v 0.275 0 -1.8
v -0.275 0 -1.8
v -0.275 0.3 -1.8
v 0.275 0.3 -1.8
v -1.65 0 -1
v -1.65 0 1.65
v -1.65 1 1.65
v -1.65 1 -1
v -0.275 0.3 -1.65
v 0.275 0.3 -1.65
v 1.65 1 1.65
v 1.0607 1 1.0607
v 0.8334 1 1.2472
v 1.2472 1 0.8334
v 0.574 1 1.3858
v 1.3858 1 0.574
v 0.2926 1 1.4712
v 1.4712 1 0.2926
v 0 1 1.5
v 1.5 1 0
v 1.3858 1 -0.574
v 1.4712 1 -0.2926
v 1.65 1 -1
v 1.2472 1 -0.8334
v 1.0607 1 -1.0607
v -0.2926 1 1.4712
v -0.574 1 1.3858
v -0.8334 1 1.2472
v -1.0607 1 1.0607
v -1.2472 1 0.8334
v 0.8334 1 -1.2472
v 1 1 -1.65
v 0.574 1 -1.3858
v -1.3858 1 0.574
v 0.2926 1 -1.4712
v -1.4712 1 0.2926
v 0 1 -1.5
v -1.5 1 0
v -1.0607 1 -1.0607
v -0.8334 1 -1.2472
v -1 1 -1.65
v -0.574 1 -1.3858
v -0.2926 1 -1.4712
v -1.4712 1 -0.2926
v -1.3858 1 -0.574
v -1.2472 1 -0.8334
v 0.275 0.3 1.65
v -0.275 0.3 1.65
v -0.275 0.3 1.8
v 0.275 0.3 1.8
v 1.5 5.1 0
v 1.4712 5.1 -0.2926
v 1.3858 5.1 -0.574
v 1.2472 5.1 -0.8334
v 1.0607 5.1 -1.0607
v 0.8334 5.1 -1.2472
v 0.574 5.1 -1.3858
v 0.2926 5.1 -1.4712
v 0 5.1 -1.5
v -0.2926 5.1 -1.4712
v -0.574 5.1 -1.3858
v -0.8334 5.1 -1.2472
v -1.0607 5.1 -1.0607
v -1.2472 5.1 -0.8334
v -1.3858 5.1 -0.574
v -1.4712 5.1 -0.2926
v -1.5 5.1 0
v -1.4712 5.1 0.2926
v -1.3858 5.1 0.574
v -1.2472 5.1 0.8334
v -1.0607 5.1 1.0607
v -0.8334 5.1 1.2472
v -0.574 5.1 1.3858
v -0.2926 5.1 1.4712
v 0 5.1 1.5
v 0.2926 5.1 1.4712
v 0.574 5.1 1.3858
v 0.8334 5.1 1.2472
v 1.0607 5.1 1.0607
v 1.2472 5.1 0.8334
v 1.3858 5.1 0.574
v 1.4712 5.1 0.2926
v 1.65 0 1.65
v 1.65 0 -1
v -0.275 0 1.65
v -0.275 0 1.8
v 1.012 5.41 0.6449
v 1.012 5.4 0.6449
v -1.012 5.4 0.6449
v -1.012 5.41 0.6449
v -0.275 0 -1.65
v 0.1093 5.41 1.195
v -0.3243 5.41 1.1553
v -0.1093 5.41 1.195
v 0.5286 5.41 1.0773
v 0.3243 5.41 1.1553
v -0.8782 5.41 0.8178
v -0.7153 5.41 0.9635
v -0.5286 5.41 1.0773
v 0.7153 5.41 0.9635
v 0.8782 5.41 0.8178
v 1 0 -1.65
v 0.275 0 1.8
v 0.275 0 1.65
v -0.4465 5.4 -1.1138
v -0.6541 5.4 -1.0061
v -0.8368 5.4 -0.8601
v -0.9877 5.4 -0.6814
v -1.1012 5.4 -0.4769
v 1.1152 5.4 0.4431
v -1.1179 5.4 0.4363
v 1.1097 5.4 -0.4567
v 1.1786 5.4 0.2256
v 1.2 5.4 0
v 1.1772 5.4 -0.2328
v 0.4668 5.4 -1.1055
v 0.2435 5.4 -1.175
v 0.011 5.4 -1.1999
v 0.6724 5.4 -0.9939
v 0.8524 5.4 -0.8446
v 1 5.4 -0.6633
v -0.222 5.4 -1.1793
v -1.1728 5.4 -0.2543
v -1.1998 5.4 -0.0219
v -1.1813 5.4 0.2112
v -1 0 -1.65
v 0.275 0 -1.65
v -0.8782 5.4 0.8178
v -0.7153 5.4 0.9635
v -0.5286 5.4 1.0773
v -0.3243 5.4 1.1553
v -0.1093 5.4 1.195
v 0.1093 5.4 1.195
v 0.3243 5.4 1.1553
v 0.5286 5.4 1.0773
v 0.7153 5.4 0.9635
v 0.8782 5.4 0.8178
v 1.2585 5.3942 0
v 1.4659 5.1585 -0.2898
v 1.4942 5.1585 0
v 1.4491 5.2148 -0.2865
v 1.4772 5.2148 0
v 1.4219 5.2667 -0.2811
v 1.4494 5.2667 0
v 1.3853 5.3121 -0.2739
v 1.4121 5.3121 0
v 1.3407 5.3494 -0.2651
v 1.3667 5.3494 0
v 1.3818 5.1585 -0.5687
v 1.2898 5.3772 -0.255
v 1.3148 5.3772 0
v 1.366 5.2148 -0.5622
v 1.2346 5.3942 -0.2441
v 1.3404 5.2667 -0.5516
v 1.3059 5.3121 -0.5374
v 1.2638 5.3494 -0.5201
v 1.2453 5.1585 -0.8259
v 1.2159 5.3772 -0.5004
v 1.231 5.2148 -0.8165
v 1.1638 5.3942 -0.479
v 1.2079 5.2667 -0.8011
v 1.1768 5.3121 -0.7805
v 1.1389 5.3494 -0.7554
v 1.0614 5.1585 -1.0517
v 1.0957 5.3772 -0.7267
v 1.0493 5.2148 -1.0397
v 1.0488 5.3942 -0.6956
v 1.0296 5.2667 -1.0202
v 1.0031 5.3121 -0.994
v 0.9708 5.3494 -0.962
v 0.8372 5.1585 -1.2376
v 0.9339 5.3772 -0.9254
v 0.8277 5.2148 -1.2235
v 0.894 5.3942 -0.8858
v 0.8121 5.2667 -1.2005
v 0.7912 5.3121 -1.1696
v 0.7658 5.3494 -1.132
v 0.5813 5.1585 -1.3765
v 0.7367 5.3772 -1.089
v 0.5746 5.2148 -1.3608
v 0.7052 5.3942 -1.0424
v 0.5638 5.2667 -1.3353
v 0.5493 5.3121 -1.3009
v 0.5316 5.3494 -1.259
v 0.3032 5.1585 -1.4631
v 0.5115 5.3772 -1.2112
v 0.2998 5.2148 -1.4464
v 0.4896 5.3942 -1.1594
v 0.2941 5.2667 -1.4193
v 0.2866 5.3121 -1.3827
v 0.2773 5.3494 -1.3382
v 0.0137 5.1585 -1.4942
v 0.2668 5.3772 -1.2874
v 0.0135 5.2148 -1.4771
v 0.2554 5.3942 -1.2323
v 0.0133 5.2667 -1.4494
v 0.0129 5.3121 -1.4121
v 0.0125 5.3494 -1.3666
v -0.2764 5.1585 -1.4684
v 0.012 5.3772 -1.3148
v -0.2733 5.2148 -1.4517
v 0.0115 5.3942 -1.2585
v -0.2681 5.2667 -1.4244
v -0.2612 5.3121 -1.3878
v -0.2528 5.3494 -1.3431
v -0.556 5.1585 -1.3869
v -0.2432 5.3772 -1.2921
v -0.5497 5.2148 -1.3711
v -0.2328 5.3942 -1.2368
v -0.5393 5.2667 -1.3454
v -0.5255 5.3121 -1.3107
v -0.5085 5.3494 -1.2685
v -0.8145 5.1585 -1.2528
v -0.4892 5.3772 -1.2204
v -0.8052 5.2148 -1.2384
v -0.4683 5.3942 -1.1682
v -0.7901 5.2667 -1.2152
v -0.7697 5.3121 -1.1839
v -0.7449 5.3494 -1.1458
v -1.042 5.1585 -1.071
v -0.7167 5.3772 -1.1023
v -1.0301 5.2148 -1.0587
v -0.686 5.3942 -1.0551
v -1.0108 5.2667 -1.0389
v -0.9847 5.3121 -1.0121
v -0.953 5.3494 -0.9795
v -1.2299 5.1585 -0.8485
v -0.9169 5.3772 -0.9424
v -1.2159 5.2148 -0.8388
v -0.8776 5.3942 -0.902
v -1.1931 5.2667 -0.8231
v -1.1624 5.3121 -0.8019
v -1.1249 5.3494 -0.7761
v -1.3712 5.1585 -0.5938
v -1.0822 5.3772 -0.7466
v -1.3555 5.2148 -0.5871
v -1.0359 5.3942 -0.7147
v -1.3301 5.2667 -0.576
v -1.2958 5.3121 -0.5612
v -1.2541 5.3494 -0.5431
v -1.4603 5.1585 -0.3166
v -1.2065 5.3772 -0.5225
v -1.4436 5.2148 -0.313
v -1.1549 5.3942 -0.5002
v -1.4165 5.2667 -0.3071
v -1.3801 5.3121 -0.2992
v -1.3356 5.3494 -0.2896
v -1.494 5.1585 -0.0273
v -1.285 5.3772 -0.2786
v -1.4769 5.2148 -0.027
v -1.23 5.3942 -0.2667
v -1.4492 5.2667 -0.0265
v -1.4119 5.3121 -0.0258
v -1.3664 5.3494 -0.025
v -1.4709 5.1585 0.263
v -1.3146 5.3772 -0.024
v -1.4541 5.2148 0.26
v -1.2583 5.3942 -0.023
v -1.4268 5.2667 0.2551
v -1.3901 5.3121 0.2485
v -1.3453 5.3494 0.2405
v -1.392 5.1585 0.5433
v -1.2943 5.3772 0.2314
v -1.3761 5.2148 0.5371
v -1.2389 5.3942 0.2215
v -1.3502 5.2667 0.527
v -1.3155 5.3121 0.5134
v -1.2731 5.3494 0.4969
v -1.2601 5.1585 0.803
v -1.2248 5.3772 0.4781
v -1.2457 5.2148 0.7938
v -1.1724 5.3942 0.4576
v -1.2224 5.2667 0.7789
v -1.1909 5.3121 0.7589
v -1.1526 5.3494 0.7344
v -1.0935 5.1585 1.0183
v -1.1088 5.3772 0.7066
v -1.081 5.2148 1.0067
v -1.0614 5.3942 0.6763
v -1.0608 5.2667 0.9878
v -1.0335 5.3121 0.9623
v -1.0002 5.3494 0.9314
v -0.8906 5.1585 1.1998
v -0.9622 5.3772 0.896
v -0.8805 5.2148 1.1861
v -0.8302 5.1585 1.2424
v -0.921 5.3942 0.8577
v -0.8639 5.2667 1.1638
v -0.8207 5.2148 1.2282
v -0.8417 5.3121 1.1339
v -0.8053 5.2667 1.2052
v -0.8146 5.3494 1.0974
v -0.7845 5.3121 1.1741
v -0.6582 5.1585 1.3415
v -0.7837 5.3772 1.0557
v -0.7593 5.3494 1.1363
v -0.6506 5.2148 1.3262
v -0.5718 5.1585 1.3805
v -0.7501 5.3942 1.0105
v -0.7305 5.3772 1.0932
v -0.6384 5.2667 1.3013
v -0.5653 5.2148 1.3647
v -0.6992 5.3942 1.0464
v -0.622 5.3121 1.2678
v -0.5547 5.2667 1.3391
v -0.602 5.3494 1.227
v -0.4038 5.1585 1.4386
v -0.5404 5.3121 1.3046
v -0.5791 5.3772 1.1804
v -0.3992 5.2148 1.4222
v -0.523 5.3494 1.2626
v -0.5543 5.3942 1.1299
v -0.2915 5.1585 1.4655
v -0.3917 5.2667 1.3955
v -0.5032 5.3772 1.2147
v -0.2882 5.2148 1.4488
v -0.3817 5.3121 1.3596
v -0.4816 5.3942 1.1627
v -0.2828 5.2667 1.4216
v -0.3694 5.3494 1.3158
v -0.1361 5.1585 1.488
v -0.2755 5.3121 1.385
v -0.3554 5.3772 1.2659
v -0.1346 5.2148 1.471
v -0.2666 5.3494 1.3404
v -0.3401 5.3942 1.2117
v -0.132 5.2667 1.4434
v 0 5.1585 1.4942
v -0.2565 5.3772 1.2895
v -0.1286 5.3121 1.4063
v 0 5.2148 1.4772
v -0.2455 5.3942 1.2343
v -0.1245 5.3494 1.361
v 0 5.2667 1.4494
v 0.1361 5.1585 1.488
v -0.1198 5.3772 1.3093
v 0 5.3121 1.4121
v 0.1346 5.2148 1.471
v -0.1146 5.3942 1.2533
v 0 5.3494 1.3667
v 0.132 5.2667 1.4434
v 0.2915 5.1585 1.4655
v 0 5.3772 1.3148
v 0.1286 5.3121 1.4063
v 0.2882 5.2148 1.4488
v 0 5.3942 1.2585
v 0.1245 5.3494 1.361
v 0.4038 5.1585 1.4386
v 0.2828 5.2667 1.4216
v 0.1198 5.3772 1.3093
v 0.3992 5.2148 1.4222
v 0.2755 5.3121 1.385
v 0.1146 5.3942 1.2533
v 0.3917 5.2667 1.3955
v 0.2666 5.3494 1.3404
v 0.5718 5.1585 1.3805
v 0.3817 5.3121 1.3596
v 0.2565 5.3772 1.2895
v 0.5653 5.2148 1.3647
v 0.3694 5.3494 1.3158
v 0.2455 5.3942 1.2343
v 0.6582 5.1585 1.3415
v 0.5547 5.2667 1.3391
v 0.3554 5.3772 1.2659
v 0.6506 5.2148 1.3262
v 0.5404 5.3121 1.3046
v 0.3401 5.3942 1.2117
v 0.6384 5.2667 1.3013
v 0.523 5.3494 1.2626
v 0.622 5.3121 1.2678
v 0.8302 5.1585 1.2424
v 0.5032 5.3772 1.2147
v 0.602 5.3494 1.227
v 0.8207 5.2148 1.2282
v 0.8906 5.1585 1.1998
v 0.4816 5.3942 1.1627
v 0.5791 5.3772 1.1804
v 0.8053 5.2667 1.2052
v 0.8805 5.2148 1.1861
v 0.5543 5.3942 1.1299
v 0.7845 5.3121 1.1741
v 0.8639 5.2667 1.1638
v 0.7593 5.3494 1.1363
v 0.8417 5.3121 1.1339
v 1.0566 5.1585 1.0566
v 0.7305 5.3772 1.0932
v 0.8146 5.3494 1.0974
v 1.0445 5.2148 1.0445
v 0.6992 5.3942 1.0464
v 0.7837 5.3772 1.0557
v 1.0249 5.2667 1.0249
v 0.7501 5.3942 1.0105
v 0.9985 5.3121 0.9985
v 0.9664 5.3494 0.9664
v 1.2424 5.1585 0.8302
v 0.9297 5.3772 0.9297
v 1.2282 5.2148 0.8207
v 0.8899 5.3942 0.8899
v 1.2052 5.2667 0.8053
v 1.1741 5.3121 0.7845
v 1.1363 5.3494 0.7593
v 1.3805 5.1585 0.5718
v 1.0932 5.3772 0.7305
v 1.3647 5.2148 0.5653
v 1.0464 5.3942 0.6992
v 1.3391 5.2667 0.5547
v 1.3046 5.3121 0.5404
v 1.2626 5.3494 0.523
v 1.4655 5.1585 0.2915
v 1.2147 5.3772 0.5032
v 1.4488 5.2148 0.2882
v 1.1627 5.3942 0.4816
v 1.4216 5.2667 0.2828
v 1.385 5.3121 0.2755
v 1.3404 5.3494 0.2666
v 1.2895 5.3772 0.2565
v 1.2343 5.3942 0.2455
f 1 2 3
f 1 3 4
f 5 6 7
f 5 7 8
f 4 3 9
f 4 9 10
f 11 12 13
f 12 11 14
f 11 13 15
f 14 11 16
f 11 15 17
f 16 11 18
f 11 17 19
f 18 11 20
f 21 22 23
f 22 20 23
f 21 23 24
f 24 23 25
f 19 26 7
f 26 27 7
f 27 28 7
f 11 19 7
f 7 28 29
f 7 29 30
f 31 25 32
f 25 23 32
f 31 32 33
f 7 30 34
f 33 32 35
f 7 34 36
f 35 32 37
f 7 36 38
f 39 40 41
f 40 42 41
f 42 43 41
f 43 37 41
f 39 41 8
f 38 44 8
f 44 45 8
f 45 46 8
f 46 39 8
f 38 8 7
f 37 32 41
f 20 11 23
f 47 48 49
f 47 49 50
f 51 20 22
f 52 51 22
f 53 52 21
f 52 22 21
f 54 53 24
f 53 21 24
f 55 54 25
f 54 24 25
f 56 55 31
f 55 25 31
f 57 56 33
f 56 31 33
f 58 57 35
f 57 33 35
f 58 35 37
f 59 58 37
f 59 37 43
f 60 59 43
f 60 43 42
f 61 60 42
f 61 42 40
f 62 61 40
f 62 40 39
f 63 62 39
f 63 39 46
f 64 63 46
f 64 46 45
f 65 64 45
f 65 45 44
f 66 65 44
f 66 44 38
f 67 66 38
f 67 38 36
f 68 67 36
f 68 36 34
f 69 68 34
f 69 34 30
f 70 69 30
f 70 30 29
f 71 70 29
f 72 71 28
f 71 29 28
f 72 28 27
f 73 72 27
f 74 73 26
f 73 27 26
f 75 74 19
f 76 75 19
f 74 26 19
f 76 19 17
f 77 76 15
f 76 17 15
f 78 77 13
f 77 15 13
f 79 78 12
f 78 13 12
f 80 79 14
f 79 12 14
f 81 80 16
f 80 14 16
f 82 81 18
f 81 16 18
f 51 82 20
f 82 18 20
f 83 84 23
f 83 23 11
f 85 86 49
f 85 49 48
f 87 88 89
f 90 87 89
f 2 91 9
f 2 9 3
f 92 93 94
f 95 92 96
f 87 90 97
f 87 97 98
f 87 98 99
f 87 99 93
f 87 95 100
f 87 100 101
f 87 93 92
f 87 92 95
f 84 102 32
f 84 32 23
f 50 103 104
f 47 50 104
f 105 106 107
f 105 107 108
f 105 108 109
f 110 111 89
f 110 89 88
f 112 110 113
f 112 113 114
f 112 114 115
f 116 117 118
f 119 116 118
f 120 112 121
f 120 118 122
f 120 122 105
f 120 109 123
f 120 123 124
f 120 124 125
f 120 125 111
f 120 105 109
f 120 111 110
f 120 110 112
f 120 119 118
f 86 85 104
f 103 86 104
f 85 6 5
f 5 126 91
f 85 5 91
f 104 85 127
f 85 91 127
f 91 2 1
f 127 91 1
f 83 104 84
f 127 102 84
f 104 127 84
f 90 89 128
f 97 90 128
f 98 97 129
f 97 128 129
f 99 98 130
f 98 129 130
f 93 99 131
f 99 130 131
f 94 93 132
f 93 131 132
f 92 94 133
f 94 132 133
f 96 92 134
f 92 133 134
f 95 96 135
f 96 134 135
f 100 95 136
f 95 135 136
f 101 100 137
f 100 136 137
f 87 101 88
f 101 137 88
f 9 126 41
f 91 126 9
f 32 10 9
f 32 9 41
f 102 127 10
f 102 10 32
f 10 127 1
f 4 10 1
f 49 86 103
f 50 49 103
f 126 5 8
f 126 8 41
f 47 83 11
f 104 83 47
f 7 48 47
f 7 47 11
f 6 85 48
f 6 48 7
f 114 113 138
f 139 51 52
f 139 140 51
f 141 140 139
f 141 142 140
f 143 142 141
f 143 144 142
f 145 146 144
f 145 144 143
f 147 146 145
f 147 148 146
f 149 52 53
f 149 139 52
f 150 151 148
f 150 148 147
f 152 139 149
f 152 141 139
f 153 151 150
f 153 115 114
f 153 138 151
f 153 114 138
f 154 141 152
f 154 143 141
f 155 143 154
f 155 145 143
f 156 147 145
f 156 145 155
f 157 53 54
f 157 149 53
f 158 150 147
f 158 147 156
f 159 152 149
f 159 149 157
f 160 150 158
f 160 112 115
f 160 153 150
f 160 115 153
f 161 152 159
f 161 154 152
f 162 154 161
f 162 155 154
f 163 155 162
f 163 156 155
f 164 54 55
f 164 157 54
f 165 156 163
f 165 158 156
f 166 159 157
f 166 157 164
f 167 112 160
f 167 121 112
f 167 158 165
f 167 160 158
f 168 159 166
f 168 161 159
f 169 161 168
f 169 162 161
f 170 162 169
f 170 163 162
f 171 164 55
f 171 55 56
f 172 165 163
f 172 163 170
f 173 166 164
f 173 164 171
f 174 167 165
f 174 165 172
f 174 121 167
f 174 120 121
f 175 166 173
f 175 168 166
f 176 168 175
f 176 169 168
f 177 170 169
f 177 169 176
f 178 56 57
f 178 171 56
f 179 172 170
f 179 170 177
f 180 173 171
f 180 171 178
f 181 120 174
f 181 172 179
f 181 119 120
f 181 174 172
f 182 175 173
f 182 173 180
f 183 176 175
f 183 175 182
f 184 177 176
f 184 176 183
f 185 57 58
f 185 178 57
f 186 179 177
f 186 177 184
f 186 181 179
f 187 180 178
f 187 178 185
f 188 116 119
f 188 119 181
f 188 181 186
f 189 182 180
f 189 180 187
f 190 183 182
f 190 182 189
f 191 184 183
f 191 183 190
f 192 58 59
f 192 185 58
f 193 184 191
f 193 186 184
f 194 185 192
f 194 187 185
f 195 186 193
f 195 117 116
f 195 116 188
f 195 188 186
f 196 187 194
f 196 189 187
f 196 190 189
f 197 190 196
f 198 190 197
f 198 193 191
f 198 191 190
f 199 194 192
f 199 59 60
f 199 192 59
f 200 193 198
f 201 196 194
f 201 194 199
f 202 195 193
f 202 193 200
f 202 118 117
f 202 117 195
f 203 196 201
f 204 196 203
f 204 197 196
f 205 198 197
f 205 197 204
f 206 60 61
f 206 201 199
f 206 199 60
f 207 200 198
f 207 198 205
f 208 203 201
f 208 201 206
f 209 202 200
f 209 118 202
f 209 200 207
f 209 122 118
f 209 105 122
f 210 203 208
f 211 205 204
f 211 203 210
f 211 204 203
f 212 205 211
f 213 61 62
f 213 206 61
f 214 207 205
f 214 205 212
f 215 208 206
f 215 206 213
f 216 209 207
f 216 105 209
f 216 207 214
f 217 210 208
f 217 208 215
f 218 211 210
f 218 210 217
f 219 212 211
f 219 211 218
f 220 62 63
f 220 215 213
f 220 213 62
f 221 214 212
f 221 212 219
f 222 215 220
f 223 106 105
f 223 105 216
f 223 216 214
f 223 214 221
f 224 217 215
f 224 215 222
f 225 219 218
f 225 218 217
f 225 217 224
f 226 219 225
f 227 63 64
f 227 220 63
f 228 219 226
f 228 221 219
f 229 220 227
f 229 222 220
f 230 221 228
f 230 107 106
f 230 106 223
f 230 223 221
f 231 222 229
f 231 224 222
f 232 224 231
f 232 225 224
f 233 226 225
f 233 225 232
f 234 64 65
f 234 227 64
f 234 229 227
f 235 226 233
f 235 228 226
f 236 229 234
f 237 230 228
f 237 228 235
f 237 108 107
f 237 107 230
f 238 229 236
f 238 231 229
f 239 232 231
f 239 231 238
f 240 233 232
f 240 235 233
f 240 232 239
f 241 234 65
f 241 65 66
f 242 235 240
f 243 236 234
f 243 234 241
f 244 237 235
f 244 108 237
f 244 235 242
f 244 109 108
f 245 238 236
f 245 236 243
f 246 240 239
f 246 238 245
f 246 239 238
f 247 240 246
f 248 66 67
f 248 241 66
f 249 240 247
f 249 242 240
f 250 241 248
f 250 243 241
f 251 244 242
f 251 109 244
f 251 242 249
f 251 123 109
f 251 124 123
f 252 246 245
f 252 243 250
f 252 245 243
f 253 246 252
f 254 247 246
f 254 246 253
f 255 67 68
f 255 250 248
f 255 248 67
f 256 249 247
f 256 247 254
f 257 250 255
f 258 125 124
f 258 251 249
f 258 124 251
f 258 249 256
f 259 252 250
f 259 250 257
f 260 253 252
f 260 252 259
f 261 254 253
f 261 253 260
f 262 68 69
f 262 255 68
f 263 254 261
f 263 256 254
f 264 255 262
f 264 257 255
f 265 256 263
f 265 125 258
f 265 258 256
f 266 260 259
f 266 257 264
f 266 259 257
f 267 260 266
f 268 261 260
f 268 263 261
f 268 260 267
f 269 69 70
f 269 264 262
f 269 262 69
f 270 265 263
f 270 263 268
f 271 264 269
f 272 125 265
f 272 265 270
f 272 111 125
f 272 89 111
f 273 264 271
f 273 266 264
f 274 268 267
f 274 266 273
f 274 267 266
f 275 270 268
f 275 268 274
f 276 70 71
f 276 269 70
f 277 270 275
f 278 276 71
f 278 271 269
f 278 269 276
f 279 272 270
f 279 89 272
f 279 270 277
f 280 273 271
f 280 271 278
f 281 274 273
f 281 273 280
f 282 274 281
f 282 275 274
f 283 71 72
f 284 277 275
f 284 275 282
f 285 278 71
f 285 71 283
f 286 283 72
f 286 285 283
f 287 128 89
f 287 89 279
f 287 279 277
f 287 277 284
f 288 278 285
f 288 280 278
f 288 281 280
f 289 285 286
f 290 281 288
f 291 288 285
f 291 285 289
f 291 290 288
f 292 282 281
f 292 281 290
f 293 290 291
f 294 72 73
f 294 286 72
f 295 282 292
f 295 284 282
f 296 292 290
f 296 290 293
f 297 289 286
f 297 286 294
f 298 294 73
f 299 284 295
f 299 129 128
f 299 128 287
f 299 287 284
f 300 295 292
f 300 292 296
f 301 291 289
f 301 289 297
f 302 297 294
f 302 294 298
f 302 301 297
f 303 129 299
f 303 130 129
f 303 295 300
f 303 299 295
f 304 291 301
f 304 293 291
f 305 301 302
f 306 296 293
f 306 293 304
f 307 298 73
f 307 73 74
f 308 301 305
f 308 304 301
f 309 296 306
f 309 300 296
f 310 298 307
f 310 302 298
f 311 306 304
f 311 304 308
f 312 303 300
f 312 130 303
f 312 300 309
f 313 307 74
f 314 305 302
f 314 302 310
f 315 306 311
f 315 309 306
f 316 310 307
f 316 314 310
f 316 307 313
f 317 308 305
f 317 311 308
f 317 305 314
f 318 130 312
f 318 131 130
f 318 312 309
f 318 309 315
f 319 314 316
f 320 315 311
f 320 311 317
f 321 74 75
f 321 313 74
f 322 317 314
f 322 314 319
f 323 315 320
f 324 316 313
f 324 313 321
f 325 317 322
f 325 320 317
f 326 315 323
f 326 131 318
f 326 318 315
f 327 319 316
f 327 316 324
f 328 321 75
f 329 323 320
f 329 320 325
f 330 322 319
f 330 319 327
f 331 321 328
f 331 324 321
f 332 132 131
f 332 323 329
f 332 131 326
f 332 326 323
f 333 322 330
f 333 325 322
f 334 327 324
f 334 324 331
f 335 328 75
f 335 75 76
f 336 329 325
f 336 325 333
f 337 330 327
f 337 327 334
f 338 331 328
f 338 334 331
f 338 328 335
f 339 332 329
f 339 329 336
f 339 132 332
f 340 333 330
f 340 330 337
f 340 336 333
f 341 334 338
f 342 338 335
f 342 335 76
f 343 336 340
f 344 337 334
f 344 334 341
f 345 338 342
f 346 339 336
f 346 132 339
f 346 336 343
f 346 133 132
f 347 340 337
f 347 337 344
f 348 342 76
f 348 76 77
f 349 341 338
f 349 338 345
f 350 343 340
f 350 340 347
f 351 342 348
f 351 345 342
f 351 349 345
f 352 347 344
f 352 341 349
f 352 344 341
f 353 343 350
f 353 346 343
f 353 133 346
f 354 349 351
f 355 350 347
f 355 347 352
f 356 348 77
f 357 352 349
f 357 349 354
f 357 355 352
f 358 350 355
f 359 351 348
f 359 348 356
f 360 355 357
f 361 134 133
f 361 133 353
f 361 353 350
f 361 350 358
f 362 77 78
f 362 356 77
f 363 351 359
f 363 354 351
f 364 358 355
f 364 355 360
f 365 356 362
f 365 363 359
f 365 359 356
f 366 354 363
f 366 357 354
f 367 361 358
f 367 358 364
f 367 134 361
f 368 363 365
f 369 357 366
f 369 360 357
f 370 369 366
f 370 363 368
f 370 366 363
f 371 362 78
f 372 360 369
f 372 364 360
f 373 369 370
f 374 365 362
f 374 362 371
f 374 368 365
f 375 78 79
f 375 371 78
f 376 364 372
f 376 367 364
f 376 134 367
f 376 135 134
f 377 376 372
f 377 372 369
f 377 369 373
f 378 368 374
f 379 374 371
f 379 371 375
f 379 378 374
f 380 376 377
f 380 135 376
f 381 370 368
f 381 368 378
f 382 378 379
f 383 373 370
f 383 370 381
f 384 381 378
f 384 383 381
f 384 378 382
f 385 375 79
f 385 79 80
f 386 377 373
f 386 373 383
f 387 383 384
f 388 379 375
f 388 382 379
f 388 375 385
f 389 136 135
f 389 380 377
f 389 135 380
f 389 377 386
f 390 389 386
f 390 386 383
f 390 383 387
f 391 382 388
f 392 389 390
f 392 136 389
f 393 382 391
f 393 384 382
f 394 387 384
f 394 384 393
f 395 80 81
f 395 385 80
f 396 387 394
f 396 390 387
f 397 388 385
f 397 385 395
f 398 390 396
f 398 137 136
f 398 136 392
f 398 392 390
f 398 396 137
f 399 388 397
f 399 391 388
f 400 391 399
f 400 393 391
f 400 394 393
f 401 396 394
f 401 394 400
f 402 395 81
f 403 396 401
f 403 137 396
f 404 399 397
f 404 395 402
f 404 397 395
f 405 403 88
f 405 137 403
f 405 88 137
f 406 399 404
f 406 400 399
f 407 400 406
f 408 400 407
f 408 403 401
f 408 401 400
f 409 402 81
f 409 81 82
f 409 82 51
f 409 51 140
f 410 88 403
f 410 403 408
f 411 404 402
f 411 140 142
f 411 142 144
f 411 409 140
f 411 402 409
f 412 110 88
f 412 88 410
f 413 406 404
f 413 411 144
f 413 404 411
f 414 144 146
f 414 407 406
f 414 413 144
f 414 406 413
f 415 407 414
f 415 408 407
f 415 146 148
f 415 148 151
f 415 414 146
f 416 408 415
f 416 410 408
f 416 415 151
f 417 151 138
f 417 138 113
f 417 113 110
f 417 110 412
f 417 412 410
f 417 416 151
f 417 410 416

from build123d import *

# Parameters (mm, degrees)
BOSS_EXTRUDE1_DEPTH = 1
SKETCH3_R           = 1.5
BOSS_EXTRUDE2_DEPTH = 5.4
FILLET1_R           = 0.3
SKETCH4_W           = 0.55
SKETCH4_H           = 1.5
BOSS_EXTRUDE3_DEPTH = 0.3
BOSS_EXTRUDE4_DEPTH = 0.01


with BuildPart() as part:
    # Sketch2 → Boss-Extrude1 (new body)
    with BuildSketch(Plane(origin=(0, 0, 0), x_dir=(1, 0, 0), z_dir=(0, 1, 0))):
        Polygon((1.65, -1.65), (-1.65, -1.65), (-1.65, 1), (-1, 1.65), (1, 1.65), (1.65, 1), align=None)
    extrude(amount=BOSS_EXTRUDE1_DEPTH)

    # Sketch3 → Boss-Extrude2 (add)
    with BuildSketch(Plane(origin=(0, 0, 0), x_dir=(1, 0, 0), z_dir=(0, 1, 0))):
        Circle(SKETCH3_R)
    extrude(amount=BOSS_EXTRUDE2_DEPTH)

    # Fillet1
    fillet1_edges = [part.edges().sort_by_distance(p)[0] for p in [
        (-1.5, 5.4, 0),
    ]]
    fillet(fillet1_edges, radius=FILLET1_R)

    # Sketch4 → Boss-Extrude3 (add)
    with BuildSketch(Plane(origin=(0, 0, 0), x_dir=(1, 0, 0), z_dir=(0, 1, 0))):
        with Locations((0, 1.05)):
            Rectangle(SKETCH4_W, SKETCH4_H)
        with Locations((0, -1.05)):
            Rectangle(SKETCH4_W, SKETCH4_H)
    extrude(amount=BOSS_EXTRUDE3_DEPTH)

    # Sketch5 → Boss-Extrude4 (add)
    with BuildSketch(Plane(origin=(0, 5.4, 0), x_dir=(1, 0, 0), z_dir=(0, 1, 0))):
        with BuildLine():
            Line((1.012005665, -0.644860089), (-1.012005665, -0.644860089))
            ThreePointArc((-1.012005665, -0.644860089), (0, -1.2), (1.012005665, -0.644860089))
        make_face()
    extrude(amount=BOSS_EXTRUDE4_DEPTH)


solid = part.part
